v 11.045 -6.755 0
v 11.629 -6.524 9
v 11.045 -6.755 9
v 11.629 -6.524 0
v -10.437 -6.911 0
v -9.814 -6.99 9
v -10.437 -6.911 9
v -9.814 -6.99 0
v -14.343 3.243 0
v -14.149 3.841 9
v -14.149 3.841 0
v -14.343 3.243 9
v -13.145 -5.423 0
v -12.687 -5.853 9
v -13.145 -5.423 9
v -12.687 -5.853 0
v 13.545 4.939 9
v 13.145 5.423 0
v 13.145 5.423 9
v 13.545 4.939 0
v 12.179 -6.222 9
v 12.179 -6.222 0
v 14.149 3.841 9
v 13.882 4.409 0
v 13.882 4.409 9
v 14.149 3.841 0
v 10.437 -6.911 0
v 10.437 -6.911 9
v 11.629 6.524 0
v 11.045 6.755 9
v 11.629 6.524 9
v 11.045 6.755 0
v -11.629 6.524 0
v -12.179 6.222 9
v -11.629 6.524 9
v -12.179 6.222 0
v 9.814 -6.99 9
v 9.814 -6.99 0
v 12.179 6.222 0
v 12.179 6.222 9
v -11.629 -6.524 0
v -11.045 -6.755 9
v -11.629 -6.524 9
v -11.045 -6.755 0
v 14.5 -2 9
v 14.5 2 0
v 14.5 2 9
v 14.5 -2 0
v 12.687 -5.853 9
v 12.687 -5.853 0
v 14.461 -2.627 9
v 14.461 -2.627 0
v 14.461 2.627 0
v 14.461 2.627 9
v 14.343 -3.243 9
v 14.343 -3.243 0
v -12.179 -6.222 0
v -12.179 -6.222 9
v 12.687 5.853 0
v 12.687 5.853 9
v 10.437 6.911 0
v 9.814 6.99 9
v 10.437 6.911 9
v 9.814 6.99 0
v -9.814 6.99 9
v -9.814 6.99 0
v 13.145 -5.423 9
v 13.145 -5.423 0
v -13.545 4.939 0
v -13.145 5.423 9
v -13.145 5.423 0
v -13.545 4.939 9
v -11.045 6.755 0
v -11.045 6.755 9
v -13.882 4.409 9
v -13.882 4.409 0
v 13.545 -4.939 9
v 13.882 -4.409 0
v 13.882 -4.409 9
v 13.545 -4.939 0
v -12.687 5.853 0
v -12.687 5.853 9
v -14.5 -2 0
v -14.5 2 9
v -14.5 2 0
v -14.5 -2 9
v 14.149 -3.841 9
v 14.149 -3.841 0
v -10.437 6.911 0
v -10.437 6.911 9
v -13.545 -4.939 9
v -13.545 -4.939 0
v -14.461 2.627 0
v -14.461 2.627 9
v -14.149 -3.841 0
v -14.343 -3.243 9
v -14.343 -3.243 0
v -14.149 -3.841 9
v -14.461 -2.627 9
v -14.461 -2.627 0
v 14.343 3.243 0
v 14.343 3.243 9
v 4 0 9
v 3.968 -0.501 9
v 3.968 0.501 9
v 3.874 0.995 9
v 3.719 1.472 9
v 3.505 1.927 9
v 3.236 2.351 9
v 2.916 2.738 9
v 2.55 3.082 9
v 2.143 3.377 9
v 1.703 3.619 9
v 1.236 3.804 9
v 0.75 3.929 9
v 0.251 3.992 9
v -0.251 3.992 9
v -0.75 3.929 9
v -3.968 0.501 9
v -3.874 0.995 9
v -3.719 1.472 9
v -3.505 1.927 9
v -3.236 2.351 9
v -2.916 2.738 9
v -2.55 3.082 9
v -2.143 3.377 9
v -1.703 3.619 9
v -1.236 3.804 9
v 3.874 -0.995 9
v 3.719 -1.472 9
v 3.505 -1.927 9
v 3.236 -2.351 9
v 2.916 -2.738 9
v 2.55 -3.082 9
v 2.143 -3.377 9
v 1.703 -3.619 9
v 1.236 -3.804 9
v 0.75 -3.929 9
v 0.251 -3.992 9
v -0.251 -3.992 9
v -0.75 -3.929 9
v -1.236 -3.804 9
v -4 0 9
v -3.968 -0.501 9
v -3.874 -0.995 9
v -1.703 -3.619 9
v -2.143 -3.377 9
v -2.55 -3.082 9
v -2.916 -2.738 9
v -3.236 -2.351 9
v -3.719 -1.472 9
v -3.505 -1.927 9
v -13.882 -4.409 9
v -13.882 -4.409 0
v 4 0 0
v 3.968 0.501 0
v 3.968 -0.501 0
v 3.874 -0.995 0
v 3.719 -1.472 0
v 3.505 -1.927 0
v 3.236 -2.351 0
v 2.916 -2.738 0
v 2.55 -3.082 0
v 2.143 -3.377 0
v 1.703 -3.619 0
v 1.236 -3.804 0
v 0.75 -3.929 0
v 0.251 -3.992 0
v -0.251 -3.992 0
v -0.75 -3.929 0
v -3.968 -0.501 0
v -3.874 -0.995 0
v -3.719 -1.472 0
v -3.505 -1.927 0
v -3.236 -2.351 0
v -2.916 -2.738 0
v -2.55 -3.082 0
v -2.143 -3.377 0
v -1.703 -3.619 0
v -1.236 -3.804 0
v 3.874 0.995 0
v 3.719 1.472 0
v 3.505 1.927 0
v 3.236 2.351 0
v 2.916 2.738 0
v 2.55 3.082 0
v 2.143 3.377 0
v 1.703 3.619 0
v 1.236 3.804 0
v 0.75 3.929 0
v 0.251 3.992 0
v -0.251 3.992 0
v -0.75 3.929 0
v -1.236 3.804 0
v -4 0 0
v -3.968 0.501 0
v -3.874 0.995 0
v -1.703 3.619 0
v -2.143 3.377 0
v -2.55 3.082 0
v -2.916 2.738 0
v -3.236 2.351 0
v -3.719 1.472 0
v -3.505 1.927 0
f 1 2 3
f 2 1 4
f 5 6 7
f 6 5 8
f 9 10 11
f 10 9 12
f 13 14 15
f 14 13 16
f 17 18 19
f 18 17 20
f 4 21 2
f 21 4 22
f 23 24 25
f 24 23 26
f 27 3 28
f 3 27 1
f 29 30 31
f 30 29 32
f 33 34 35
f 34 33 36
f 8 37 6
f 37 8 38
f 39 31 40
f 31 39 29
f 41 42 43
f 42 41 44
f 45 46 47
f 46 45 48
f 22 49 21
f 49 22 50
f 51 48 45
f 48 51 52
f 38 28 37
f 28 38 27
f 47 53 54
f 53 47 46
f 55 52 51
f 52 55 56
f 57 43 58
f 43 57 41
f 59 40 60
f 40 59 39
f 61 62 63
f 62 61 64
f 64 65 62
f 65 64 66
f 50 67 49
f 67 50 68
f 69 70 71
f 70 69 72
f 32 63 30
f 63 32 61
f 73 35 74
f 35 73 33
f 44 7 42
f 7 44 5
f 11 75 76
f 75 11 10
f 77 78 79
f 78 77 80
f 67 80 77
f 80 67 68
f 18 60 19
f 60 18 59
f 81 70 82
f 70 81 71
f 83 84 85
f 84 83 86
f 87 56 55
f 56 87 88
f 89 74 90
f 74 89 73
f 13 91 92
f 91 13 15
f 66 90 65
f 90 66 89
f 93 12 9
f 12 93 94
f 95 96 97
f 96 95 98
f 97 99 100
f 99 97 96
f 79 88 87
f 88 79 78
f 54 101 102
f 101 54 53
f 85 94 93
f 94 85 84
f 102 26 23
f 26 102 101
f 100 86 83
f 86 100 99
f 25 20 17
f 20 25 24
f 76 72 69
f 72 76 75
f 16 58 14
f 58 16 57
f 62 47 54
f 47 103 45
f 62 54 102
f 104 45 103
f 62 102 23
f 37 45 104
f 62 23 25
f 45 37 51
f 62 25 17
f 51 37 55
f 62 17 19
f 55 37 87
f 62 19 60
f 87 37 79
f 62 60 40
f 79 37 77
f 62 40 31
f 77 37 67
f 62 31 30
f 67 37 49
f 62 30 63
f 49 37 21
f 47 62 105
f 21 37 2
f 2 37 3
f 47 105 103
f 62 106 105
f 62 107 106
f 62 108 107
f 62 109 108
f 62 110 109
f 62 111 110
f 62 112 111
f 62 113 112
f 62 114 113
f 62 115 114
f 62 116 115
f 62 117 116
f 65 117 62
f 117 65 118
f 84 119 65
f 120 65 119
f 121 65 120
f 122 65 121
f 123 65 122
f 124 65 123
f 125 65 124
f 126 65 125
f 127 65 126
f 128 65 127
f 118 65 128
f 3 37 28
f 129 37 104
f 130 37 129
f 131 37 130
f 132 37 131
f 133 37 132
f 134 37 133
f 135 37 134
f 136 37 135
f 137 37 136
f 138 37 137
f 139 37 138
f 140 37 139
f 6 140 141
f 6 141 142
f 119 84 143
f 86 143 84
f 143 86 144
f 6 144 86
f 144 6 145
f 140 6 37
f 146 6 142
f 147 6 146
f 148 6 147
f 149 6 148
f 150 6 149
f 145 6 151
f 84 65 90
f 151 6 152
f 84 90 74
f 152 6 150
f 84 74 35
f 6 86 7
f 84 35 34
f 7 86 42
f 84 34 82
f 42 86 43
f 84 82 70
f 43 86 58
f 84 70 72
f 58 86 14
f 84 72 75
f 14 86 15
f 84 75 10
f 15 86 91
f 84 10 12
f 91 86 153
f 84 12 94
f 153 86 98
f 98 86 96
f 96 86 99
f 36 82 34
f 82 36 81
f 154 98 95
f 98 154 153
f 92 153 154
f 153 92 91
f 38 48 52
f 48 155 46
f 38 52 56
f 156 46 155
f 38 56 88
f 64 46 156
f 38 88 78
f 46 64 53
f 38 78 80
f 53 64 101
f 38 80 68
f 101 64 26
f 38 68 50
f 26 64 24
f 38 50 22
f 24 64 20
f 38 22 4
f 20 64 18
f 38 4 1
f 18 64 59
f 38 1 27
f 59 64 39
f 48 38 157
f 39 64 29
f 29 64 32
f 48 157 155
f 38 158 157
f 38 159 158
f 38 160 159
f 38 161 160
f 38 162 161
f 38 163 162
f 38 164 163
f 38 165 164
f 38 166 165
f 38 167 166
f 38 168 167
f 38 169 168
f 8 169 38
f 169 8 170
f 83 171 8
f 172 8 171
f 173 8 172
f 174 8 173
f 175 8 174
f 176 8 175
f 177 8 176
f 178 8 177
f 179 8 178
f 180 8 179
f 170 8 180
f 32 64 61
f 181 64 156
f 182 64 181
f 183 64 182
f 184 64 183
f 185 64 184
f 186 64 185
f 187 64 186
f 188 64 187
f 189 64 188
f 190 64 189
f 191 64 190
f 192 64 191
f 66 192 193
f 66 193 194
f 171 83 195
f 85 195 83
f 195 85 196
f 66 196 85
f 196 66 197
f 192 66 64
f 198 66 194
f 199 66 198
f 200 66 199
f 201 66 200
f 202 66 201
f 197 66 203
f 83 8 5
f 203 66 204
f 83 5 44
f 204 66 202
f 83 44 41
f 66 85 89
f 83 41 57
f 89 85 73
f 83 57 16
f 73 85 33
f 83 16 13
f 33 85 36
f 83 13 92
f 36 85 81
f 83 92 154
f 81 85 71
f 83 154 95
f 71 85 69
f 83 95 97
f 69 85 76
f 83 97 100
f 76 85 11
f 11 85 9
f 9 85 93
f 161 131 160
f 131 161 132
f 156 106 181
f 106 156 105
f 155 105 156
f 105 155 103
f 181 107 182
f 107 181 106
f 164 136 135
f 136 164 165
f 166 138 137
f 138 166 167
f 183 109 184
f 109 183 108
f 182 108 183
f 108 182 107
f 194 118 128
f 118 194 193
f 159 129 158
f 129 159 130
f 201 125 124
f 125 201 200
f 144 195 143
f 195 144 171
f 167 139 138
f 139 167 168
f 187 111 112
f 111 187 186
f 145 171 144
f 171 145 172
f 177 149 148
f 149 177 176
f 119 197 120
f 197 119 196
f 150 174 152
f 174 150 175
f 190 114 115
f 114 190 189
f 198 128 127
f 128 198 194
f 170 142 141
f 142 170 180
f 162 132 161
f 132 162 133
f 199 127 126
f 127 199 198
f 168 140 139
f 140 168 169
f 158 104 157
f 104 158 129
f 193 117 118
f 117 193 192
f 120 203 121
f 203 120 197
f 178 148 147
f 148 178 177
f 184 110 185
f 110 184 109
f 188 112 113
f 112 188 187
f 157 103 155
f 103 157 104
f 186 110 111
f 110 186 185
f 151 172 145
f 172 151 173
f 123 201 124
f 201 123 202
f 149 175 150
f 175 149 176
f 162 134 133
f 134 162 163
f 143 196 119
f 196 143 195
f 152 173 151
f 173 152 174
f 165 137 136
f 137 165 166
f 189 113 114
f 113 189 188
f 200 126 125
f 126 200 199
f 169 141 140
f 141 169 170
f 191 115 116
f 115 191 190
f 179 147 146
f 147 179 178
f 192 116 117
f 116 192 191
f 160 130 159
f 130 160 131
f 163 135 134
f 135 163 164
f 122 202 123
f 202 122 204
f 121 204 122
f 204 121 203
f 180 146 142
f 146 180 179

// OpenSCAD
$fn = 50;

difference() {
	union() {
		hull() {
			translate(v = [-9.5, 2.0, 0]) {
				cylinder(h = 9, r = 5);
			}
			translate(v = [9.5, 2.0, 0]) {
				cylinder(h = 9, r = 5);
			}
			translate(v = [-9.5, -2.0, 0]) {
				cylinder(h = 9, r = 5);
			}
			translate(v = [9.5, -2.0, 0]) {
				cylinder(h = 9, r = 5);
			}
		}
	}
	union() {
		cylinder(h = 9, r = 4.0);
	}
}
